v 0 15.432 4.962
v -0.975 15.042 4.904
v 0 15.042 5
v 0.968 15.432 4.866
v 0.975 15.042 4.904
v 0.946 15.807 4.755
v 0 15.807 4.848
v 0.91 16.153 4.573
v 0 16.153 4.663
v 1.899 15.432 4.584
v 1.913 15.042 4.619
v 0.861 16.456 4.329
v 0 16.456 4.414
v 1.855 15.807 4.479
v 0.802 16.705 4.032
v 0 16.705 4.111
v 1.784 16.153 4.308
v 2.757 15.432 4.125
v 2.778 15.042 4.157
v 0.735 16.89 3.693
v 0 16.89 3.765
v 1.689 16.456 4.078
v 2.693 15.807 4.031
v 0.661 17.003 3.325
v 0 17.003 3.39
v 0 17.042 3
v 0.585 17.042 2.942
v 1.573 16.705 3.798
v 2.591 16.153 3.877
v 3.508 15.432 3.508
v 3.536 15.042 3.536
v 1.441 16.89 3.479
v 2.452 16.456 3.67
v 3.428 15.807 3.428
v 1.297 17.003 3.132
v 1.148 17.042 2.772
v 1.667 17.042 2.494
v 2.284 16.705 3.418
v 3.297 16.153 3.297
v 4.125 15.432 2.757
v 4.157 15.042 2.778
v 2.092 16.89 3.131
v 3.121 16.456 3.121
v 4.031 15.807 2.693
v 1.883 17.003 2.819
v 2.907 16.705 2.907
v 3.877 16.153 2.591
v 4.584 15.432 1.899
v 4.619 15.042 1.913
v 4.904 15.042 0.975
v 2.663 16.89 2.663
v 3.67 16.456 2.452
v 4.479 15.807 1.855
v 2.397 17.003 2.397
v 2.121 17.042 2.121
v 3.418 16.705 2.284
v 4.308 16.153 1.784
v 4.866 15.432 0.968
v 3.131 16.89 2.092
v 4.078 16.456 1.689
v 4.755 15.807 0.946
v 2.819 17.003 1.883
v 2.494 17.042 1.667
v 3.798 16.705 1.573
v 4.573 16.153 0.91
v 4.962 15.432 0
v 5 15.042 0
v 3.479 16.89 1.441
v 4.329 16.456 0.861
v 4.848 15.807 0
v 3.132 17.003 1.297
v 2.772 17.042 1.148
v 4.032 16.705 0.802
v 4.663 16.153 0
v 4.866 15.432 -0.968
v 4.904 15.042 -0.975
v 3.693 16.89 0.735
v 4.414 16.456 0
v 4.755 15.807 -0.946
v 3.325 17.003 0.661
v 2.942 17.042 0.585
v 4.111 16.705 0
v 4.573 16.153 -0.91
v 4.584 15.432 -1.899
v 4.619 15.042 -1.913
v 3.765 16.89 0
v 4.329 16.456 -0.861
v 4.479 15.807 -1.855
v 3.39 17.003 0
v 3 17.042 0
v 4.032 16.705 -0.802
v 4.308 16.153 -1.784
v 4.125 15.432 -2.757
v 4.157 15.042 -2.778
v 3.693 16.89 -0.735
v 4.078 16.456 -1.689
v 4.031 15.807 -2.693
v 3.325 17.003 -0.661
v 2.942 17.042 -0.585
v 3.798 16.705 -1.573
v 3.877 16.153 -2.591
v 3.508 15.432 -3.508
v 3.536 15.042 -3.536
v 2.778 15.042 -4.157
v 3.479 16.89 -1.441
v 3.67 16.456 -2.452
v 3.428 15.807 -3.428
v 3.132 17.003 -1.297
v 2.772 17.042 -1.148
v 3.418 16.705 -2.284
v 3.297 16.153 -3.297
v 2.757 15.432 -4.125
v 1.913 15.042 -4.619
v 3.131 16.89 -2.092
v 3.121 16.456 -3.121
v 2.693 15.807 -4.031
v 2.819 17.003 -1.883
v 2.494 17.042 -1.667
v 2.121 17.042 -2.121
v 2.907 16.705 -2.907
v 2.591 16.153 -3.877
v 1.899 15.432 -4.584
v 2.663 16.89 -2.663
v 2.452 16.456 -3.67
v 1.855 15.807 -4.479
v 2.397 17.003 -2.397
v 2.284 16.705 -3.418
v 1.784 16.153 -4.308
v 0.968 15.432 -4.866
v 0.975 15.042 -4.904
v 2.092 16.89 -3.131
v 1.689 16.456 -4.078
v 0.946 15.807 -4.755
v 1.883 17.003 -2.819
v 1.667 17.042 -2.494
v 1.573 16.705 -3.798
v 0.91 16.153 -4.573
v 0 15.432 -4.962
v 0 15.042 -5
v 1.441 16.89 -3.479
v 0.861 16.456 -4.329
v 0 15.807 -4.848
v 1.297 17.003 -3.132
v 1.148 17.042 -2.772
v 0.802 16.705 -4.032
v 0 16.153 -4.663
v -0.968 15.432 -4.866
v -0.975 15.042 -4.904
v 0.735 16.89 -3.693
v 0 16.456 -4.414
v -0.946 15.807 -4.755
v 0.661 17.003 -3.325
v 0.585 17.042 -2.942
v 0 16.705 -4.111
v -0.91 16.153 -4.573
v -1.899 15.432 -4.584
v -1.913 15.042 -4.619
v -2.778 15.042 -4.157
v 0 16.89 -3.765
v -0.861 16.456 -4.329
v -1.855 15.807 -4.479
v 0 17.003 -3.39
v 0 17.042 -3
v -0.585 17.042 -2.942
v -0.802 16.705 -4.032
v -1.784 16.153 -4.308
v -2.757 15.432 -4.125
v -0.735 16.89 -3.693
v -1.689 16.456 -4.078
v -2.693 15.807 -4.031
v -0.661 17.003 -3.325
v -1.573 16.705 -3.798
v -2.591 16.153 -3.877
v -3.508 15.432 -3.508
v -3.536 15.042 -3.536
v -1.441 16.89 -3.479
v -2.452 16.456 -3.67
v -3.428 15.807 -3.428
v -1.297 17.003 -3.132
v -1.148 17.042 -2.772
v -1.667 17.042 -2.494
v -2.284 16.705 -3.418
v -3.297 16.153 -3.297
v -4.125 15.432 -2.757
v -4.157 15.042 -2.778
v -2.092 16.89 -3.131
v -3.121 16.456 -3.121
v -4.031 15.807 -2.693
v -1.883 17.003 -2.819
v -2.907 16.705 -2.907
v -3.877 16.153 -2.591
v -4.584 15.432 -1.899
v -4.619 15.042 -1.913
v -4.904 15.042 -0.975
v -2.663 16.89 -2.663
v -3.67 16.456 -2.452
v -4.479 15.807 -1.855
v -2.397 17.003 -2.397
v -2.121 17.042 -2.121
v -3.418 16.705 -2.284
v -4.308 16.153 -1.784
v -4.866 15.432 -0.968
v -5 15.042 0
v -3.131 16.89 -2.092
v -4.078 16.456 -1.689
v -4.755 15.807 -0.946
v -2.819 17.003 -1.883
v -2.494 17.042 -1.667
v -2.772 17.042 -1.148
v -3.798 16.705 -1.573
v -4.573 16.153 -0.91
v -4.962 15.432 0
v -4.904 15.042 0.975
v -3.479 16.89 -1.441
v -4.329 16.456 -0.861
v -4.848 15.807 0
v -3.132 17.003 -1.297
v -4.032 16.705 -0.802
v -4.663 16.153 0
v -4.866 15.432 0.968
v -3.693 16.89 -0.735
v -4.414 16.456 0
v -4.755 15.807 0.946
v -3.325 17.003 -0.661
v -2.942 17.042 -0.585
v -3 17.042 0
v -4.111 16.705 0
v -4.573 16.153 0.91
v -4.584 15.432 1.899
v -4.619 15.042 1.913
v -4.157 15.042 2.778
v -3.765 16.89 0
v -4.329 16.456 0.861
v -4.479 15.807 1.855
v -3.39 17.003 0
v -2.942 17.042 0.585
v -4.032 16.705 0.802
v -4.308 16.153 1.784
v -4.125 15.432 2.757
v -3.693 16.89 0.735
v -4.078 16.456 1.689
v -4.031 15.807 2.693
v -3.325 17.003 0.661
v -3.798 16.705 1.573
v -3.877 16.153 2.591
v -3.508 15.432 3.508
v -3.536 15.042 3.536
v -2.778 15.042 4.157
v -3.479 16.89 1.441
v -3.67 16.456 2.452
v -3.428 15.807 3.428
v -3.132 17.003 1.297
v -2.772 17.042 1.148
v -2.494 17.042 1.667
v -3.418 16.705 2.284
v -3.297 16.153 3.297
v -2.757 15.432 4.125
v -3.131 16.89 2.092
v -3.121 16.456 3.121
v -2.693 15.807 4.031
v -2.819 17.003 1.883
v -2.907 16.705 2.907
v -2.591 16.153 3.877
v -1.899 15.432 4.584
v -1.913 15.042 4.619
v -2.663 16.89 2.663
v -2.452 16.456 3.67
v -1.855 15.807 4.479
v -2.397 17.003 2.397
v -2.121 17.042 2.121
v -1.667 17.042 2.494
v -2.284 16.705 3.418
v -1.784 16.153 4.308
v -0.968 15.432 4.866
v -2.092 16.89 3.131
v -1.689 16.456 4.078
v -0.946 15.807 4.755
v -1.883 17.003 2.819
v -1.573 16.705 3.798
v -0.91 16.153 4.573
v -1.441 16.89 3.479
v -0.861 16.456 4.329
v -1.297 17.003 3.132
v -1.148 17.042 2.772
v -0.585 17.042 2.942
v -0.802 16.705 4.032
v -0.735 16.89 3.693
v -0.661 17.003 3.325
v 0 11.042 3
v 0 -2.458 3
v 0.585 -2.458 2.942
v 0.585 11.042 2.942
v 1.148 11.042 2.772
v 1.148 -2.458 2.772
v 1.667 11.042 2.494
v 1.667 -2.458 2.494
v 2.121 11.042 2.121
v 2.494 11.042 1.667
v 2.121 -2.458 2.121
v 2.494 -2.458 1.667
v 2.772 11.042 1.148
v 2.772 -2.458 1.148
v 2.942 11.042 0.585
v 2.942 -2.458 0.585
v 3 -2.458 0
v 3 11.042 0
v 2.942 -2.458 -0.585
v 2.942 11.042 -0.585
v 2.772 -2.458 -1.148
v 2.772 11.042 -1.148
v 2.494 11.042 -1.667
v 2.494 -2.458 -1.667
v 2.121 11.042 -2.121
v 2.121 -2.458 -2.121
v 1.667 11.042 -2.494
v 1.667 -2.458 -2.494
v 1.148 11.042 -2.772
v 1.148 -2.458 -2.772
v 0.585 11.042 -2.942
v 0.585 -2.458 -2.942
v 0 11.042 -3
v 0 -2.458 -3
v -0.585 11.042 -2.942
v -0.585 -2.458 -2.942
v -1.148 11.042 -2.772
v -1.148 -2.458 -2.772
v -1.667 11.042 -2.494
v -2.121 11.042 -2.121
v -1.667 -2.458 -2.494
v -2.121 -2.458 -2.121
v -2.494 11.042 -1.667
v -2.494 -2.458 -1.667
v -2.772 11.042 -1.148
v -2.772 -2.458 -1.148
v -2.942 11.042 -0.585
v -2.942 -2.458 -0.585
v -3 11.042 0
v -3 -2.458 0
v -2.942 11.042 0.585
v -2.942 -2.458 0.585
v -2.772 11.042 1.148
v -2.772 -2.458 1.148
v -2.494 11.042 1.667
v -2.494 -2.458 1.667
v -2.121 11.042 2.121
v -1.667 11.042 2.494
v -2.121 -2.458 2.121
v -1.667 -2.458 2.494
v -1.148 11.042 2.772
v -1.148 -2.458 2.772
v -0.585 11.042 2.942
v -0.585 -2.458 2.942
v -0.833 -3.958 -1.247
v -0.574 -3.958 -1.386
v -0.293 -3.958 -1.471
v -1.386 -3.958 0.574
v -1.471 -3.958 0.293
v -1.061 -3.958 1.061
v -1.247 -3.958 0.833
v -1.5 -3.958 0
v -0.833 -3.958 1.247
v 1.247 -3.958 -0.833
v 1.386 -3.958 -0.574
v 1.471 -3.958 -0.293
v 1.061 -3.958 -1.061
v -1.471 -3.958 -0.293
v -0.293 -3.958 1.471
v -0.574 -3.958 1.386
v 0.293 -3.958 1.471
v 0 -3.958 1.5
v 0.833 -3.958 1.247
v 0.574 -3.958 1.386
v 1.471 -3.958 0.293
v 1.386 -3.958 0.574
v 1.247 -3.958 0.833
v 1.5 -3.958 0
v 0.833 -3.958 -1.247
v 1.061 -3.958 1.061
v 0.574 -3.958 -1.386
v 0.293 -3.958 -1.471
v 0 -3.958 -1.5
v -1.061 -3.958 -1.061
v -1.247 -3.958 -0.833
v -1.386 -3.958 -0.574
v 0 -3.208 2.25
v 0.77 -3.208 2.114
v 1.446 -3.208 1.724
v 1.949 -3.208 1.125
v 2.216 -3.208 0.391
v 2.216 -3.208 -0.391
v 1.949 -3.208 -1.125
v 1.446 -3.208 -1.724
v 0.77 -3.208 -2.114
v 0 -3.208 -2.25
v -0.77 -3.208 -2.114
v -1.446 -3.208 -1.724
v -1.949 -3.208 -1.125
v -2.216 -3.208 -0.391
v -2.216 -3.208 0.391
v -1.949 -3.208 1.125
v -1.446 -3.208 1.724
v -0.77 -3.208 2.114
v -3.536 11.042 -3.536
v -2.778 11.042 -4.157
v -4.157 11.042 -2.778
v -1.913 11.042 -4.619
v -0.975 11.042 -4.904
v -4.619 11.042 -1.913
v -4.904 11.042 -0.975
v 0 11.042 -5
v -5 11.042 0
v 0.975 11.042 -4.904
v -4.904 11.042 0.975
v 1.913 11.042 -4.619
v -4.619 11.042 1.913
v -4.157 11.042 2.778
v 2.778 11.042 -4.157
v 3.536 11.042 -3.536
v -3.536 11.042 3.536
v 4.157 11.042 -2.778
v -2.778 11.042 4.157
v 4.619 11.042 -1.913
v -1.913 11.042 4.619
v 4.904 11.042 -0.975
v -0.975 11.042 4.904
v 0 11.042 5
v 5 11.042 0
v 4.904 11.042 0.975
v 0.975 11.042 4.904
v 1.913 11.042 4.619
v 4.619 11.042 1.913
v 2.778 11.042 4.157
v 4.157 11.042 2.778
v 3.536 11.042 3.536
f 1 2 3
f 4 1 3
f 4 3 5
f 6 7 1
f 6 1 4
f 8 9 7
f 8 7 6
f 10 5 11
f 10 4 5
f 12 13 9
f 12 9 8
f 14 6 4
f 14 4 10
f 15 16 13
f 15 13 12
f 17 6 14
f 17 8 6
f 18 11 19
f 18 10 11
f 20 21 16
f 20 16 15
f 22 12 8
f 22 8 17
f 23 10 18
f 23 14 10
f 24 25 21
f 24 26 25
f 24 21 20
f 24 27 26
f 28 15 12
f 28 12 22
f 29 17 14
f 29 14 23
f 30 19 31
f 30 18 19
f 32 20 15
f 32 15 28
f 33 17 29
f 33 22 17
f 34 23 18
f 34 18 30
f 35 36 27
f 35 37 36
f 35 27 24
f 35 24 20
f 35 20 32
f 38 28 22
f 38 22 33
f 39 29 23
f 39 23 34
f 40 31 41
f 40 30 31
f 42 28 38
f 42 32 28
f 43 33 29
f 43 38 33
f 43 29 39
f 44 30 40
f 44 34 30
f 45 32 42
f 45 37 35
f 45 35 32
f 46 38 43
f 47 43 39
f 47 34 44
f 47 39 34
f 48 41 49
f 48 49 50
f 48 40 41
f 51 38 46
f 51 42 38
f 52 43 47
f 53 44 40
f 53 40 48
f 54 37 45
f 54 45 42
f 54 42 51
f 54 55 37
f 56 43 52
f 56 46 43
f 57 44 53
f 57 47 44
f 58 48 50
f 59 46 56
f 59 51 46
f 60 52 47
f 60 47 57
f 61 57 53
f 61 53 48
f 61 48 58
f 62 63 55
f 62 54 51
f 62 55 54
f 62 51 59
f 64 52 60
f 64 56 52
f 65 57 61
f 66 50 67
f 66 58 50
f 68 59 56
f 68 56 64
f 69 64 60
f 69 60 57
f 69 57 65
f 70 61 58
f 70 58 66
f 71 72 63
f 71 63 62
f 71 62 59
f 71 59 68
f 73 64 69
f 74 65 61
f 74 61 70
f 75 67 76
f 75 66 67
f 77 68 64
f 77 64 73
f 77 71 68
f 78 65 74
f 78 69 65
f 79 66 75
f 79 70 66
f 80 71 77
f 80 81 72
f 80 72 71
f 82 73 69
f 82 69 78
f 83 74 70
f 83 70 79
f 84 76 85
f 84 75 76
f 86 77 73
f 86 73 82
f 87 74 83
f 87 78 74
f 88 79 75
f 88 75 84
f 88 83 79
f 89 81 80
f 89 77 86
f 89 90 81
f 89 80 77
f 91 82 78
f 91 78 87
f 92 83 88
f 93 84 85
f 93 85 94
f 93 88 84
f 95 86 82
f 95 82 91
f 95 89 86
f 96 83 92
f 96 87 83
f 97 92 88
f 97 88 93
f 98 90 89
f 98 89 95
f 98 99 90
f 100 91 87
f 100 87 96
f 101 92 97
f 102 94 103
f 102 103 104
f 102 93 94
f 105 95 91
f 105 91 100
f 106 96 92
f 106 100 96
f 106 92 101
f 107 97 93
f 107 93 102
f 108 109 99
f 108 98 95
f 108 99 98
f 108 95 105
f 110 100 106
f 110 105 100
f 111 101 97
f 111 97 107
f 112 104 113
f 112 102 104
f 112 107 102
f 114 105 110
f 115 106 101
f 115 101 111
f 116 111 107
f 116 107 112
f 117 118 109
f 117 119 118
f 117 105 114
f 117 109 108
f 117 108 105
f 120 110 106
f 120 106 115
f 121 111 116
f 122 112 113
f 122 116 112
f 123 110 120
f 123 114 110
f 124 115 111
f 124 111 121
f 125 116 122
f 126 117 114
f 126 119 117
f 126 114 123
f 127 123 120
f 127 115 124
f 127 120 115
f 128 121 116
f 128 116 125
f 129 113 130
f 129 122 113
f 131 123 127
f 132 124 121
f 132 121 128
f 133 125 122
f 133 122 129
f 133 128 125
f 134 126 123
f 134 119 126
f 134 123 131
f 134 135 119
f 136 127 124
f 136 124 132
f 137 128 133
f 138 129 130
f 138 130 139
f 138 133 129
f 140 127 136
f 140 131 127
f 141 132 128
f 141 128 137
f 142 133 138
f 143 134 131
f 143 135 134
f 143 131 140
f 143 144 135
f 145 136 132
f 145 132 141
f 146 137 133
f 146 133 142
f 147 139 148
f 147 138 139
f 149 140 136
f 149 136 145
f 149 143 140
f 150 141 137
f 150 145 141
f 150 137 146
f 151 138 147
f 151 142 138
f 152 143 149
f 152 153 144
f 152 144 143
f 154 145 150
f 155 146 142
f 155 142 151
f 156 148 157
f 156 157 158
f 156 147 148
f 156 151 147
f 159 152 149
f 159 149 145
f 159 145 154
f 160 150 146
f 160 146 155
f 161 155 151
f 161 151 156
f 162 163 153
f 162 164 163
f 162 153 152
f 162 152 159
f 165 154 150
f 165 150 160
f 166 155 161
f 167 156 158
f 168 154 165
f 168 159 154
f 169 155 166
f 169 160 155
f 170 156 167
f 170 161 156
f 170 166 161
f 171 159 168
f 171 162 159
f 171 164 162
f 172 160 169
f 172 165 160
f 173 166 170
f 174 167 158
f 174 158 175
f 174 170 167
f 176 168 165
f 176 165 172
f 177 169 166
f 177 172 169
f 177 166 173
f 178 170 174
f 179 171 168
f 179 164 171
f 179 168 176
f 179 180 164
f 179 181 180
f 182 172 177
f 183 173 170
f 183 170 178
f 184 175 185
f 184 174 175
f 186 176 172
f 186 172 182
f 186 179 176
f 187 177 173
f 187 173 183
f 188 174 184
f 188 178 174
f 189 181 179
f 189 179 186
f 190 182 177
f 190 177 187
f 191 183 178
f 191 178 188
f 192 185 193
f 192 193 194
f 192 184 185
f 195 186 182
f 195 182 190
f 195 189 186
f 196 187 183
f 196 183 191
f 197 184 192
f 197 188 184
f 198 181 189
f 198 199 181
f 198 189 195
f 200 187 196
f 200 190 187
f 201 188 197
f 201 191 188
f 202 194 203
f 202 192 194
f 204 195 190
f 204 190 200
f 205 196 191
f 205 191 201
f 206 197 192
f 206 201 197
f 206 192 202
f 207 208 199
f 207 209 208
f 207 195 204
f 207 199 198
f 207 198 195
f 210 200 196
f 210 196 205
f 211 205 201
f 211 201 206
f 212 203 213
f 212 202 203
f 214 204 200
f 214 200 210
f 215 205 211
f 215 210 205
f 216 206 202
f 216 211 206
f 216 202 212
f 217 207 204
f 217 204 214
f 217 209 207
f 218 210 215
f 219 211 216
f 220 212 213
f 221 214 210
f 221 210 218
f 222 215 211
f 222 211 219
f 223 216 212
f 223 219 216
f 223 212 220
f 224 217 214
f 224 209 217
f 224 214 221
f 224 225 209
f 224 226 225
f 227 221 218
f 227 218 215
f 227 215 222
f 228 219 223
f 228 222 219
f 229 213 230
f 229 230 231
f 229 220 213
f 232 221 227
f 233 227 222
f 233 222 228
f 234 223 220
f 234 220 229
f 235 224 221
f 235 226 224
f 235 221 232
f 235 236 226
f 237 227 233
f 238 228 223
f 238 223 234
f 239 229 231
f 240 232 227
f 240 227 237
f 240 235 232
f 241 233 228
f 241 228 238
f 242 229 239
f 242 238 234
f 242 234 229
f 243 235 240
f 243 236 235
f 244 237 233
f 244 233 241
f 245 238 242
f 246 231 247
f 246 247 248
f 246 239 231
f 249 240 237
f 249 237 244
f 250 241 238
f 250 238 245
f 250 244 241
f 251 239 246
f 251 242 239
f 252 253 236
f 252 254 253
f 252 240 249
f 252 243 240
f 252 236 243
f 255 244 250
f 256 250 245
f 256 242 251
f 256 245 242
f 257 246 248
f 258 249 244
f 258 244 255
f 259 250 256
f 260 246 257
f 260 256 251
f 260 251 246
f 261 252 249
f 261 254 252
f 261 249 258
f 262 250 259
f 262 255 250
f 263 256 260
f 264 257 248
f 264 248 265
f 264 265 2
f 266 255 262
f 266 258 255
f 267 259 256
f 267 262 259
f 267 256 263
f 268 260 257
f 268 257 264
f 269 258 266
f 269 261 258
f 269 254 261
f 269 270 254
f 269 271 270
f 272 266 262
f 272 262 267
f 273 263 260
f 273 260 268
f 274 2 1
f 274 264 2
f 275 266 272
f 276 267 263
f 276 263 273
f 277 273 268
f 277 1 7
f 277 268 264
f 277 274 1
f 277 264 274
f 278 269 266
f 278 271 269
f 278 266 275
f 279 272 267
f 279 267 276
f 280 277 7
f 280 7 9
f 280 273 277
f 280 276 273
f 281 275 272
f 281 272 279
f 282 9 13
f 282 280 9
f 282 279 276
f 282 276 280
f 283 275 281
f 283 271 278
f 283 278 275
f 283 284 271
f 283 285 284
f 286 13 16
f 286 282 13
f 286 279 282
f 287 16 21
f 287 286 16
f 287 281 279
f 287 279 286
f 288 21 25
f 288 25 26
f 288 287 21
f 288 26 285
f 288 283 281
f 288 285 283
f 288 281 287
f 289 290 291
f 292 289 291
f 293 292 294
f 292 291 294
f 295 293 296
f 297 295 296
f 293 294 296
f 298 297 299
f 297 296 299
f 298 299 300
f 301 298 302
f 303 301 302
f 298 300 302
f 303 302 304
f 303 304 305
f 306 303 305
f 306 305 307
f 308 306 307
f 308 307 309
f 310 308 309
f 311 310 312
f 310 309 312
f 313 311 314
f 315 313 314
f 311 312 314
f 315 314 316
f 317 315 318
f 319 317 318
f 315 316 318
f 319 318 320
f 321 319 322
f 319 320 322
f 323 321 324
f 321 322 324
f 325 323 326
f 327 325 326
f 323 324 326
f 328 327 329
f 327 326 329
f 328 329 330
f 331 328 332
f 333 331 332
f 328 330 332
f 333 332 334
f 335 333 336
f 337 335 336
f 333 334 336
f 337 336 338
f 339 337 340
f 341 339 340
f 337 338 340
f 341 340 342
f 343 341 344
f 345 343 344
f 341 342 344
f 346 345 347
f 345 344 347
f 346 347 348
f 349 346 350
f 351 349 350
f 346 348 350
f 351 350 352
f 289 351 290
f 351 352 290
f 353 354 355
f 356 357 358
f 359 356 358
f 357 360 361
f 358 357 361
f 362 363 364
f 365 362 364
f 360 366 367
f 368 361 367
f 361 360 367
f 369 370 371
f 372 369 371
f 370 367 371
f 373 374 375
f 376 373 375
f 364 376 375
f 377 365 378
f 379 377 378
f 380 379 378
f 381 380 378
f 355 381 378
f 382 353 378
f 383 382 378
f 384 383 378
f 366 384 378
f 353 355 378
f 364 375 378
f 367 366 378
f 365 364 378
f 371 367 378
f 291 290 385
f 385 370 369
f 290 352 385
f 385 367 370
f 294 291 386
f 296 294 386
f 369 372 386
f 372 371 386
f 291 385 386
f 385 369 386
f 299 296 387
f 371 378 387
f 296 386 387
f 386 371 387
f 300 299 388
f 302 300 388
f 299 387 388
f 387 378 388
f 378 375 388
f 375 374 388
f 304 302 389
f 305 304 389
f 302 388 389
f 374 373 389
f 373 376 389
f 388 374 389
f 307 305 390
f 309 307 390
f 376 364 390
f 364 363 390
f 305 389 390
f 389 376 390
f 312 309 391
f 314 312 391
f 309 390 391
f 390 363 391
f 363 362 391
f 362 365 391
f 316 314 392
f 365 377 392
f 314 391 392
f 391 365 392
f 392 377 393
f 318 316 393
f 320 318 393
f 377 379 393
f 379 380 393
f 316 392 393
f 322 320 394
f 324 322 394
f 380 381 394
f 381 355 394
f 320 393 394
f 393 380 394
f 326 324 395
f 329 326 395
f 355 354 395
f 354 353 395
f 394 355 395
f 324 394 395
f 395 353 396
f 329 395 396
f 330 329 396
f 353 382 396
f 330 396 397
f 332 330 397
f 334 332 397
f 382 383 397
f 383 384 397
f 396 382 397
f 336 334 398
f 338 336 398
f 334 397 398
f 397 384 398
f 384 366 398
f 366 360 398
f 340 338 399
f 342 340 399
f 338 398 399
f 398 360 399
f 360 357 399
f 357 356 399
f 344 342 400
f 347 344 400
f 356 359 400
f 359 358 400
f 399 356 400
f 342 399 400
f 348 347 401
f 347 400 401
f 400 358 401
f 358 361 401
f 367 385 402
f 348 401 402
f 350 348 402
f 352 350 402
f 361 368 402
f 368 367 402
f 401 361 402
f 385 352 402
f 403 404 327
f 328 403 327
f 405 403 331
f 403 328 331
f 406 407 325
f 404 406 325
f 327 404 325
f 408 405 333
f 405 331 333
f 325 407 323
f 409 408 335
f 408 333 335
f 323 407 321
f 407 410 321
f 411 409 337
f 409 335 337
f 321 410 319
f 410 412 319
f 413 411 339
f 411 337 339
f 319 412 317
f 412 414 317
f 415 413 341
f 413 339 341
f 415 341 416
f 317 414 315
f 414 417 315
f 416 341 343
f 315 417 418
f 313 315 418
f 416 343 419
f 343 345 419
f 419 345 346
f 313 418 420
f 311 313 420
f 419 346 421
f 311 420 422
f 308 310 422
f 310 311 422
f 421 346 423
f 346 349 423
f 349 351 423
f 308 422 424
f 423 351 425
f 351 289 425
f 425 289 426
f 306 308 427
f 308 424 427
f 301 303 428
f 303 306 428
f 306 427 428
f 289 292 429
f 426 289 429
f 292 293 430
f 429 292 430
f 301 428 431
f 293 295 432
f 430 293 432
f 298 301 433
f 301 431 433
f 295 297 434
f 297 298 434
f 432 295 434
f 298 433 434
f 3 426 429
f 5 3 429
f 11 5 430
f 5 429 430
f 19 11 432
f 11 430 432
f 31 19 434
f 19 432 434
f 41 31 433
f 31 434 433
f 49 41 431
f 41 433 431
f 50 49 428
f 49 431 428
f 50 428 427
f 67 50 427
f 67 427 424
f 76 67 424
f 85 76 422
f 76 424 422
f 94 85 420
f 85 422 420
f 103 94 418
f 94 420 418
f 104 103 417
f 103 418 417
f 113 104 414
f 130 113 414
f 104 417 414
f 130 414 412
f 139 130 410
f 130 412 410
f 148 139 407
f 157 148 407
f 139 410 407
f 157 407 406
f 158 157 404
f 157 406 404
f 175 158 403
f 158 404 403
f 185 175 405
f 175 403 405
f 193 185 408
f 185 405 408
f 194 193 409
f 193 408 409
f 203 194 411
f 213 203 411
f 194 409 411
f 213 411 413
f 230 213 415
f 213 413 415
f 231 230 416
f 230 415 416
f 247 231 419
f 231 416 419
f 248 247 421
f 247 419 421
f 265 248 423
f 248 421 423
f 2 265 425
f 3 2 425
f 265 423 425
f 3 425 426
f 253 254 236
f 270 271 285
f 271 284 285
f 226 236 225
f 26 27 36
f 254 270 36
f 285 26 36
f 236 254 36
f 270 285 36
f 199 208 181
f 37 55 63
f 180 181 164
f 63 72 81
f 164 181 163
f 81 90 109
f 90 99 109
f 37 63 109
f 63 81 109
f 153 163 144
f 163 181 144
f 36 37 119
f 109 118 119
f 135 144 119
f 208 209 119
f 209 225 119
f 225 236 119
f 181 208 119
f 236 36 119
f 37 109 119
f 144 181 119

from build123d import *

# Parameters (mm, degrees)
F2_SIZE = 1.5
F3_R    = 2


with BuildPart() as f1:
    # F0 (on Right) → F1 (revolve)
    with BuildSketch(Plane.YZ):
        Polygon((-3.958115, 0), (17.041885, 0), (17.041885, 5), (11.041885, 5), (11.041885, 3), (-3.958115, 3), align=None)
    revolve(axis=Axis((0, 6.541885, 0), (0, 1, 0)))

    # F2
    f2_edges = [f1.edges().sort_by_distance(p)[0] for p in [
        (0, -3.958115, -3),
    ]]
    chamfer(f2_edges, length=F2_SIZE)

    # F3
    f3_edges = [f1.edges().sort_by_distance(p)[0] for p in [
        (0, 17.041885, -5),
    ]]
    fillet(f3_edges, radius=F3_R)


solid = f1.part
